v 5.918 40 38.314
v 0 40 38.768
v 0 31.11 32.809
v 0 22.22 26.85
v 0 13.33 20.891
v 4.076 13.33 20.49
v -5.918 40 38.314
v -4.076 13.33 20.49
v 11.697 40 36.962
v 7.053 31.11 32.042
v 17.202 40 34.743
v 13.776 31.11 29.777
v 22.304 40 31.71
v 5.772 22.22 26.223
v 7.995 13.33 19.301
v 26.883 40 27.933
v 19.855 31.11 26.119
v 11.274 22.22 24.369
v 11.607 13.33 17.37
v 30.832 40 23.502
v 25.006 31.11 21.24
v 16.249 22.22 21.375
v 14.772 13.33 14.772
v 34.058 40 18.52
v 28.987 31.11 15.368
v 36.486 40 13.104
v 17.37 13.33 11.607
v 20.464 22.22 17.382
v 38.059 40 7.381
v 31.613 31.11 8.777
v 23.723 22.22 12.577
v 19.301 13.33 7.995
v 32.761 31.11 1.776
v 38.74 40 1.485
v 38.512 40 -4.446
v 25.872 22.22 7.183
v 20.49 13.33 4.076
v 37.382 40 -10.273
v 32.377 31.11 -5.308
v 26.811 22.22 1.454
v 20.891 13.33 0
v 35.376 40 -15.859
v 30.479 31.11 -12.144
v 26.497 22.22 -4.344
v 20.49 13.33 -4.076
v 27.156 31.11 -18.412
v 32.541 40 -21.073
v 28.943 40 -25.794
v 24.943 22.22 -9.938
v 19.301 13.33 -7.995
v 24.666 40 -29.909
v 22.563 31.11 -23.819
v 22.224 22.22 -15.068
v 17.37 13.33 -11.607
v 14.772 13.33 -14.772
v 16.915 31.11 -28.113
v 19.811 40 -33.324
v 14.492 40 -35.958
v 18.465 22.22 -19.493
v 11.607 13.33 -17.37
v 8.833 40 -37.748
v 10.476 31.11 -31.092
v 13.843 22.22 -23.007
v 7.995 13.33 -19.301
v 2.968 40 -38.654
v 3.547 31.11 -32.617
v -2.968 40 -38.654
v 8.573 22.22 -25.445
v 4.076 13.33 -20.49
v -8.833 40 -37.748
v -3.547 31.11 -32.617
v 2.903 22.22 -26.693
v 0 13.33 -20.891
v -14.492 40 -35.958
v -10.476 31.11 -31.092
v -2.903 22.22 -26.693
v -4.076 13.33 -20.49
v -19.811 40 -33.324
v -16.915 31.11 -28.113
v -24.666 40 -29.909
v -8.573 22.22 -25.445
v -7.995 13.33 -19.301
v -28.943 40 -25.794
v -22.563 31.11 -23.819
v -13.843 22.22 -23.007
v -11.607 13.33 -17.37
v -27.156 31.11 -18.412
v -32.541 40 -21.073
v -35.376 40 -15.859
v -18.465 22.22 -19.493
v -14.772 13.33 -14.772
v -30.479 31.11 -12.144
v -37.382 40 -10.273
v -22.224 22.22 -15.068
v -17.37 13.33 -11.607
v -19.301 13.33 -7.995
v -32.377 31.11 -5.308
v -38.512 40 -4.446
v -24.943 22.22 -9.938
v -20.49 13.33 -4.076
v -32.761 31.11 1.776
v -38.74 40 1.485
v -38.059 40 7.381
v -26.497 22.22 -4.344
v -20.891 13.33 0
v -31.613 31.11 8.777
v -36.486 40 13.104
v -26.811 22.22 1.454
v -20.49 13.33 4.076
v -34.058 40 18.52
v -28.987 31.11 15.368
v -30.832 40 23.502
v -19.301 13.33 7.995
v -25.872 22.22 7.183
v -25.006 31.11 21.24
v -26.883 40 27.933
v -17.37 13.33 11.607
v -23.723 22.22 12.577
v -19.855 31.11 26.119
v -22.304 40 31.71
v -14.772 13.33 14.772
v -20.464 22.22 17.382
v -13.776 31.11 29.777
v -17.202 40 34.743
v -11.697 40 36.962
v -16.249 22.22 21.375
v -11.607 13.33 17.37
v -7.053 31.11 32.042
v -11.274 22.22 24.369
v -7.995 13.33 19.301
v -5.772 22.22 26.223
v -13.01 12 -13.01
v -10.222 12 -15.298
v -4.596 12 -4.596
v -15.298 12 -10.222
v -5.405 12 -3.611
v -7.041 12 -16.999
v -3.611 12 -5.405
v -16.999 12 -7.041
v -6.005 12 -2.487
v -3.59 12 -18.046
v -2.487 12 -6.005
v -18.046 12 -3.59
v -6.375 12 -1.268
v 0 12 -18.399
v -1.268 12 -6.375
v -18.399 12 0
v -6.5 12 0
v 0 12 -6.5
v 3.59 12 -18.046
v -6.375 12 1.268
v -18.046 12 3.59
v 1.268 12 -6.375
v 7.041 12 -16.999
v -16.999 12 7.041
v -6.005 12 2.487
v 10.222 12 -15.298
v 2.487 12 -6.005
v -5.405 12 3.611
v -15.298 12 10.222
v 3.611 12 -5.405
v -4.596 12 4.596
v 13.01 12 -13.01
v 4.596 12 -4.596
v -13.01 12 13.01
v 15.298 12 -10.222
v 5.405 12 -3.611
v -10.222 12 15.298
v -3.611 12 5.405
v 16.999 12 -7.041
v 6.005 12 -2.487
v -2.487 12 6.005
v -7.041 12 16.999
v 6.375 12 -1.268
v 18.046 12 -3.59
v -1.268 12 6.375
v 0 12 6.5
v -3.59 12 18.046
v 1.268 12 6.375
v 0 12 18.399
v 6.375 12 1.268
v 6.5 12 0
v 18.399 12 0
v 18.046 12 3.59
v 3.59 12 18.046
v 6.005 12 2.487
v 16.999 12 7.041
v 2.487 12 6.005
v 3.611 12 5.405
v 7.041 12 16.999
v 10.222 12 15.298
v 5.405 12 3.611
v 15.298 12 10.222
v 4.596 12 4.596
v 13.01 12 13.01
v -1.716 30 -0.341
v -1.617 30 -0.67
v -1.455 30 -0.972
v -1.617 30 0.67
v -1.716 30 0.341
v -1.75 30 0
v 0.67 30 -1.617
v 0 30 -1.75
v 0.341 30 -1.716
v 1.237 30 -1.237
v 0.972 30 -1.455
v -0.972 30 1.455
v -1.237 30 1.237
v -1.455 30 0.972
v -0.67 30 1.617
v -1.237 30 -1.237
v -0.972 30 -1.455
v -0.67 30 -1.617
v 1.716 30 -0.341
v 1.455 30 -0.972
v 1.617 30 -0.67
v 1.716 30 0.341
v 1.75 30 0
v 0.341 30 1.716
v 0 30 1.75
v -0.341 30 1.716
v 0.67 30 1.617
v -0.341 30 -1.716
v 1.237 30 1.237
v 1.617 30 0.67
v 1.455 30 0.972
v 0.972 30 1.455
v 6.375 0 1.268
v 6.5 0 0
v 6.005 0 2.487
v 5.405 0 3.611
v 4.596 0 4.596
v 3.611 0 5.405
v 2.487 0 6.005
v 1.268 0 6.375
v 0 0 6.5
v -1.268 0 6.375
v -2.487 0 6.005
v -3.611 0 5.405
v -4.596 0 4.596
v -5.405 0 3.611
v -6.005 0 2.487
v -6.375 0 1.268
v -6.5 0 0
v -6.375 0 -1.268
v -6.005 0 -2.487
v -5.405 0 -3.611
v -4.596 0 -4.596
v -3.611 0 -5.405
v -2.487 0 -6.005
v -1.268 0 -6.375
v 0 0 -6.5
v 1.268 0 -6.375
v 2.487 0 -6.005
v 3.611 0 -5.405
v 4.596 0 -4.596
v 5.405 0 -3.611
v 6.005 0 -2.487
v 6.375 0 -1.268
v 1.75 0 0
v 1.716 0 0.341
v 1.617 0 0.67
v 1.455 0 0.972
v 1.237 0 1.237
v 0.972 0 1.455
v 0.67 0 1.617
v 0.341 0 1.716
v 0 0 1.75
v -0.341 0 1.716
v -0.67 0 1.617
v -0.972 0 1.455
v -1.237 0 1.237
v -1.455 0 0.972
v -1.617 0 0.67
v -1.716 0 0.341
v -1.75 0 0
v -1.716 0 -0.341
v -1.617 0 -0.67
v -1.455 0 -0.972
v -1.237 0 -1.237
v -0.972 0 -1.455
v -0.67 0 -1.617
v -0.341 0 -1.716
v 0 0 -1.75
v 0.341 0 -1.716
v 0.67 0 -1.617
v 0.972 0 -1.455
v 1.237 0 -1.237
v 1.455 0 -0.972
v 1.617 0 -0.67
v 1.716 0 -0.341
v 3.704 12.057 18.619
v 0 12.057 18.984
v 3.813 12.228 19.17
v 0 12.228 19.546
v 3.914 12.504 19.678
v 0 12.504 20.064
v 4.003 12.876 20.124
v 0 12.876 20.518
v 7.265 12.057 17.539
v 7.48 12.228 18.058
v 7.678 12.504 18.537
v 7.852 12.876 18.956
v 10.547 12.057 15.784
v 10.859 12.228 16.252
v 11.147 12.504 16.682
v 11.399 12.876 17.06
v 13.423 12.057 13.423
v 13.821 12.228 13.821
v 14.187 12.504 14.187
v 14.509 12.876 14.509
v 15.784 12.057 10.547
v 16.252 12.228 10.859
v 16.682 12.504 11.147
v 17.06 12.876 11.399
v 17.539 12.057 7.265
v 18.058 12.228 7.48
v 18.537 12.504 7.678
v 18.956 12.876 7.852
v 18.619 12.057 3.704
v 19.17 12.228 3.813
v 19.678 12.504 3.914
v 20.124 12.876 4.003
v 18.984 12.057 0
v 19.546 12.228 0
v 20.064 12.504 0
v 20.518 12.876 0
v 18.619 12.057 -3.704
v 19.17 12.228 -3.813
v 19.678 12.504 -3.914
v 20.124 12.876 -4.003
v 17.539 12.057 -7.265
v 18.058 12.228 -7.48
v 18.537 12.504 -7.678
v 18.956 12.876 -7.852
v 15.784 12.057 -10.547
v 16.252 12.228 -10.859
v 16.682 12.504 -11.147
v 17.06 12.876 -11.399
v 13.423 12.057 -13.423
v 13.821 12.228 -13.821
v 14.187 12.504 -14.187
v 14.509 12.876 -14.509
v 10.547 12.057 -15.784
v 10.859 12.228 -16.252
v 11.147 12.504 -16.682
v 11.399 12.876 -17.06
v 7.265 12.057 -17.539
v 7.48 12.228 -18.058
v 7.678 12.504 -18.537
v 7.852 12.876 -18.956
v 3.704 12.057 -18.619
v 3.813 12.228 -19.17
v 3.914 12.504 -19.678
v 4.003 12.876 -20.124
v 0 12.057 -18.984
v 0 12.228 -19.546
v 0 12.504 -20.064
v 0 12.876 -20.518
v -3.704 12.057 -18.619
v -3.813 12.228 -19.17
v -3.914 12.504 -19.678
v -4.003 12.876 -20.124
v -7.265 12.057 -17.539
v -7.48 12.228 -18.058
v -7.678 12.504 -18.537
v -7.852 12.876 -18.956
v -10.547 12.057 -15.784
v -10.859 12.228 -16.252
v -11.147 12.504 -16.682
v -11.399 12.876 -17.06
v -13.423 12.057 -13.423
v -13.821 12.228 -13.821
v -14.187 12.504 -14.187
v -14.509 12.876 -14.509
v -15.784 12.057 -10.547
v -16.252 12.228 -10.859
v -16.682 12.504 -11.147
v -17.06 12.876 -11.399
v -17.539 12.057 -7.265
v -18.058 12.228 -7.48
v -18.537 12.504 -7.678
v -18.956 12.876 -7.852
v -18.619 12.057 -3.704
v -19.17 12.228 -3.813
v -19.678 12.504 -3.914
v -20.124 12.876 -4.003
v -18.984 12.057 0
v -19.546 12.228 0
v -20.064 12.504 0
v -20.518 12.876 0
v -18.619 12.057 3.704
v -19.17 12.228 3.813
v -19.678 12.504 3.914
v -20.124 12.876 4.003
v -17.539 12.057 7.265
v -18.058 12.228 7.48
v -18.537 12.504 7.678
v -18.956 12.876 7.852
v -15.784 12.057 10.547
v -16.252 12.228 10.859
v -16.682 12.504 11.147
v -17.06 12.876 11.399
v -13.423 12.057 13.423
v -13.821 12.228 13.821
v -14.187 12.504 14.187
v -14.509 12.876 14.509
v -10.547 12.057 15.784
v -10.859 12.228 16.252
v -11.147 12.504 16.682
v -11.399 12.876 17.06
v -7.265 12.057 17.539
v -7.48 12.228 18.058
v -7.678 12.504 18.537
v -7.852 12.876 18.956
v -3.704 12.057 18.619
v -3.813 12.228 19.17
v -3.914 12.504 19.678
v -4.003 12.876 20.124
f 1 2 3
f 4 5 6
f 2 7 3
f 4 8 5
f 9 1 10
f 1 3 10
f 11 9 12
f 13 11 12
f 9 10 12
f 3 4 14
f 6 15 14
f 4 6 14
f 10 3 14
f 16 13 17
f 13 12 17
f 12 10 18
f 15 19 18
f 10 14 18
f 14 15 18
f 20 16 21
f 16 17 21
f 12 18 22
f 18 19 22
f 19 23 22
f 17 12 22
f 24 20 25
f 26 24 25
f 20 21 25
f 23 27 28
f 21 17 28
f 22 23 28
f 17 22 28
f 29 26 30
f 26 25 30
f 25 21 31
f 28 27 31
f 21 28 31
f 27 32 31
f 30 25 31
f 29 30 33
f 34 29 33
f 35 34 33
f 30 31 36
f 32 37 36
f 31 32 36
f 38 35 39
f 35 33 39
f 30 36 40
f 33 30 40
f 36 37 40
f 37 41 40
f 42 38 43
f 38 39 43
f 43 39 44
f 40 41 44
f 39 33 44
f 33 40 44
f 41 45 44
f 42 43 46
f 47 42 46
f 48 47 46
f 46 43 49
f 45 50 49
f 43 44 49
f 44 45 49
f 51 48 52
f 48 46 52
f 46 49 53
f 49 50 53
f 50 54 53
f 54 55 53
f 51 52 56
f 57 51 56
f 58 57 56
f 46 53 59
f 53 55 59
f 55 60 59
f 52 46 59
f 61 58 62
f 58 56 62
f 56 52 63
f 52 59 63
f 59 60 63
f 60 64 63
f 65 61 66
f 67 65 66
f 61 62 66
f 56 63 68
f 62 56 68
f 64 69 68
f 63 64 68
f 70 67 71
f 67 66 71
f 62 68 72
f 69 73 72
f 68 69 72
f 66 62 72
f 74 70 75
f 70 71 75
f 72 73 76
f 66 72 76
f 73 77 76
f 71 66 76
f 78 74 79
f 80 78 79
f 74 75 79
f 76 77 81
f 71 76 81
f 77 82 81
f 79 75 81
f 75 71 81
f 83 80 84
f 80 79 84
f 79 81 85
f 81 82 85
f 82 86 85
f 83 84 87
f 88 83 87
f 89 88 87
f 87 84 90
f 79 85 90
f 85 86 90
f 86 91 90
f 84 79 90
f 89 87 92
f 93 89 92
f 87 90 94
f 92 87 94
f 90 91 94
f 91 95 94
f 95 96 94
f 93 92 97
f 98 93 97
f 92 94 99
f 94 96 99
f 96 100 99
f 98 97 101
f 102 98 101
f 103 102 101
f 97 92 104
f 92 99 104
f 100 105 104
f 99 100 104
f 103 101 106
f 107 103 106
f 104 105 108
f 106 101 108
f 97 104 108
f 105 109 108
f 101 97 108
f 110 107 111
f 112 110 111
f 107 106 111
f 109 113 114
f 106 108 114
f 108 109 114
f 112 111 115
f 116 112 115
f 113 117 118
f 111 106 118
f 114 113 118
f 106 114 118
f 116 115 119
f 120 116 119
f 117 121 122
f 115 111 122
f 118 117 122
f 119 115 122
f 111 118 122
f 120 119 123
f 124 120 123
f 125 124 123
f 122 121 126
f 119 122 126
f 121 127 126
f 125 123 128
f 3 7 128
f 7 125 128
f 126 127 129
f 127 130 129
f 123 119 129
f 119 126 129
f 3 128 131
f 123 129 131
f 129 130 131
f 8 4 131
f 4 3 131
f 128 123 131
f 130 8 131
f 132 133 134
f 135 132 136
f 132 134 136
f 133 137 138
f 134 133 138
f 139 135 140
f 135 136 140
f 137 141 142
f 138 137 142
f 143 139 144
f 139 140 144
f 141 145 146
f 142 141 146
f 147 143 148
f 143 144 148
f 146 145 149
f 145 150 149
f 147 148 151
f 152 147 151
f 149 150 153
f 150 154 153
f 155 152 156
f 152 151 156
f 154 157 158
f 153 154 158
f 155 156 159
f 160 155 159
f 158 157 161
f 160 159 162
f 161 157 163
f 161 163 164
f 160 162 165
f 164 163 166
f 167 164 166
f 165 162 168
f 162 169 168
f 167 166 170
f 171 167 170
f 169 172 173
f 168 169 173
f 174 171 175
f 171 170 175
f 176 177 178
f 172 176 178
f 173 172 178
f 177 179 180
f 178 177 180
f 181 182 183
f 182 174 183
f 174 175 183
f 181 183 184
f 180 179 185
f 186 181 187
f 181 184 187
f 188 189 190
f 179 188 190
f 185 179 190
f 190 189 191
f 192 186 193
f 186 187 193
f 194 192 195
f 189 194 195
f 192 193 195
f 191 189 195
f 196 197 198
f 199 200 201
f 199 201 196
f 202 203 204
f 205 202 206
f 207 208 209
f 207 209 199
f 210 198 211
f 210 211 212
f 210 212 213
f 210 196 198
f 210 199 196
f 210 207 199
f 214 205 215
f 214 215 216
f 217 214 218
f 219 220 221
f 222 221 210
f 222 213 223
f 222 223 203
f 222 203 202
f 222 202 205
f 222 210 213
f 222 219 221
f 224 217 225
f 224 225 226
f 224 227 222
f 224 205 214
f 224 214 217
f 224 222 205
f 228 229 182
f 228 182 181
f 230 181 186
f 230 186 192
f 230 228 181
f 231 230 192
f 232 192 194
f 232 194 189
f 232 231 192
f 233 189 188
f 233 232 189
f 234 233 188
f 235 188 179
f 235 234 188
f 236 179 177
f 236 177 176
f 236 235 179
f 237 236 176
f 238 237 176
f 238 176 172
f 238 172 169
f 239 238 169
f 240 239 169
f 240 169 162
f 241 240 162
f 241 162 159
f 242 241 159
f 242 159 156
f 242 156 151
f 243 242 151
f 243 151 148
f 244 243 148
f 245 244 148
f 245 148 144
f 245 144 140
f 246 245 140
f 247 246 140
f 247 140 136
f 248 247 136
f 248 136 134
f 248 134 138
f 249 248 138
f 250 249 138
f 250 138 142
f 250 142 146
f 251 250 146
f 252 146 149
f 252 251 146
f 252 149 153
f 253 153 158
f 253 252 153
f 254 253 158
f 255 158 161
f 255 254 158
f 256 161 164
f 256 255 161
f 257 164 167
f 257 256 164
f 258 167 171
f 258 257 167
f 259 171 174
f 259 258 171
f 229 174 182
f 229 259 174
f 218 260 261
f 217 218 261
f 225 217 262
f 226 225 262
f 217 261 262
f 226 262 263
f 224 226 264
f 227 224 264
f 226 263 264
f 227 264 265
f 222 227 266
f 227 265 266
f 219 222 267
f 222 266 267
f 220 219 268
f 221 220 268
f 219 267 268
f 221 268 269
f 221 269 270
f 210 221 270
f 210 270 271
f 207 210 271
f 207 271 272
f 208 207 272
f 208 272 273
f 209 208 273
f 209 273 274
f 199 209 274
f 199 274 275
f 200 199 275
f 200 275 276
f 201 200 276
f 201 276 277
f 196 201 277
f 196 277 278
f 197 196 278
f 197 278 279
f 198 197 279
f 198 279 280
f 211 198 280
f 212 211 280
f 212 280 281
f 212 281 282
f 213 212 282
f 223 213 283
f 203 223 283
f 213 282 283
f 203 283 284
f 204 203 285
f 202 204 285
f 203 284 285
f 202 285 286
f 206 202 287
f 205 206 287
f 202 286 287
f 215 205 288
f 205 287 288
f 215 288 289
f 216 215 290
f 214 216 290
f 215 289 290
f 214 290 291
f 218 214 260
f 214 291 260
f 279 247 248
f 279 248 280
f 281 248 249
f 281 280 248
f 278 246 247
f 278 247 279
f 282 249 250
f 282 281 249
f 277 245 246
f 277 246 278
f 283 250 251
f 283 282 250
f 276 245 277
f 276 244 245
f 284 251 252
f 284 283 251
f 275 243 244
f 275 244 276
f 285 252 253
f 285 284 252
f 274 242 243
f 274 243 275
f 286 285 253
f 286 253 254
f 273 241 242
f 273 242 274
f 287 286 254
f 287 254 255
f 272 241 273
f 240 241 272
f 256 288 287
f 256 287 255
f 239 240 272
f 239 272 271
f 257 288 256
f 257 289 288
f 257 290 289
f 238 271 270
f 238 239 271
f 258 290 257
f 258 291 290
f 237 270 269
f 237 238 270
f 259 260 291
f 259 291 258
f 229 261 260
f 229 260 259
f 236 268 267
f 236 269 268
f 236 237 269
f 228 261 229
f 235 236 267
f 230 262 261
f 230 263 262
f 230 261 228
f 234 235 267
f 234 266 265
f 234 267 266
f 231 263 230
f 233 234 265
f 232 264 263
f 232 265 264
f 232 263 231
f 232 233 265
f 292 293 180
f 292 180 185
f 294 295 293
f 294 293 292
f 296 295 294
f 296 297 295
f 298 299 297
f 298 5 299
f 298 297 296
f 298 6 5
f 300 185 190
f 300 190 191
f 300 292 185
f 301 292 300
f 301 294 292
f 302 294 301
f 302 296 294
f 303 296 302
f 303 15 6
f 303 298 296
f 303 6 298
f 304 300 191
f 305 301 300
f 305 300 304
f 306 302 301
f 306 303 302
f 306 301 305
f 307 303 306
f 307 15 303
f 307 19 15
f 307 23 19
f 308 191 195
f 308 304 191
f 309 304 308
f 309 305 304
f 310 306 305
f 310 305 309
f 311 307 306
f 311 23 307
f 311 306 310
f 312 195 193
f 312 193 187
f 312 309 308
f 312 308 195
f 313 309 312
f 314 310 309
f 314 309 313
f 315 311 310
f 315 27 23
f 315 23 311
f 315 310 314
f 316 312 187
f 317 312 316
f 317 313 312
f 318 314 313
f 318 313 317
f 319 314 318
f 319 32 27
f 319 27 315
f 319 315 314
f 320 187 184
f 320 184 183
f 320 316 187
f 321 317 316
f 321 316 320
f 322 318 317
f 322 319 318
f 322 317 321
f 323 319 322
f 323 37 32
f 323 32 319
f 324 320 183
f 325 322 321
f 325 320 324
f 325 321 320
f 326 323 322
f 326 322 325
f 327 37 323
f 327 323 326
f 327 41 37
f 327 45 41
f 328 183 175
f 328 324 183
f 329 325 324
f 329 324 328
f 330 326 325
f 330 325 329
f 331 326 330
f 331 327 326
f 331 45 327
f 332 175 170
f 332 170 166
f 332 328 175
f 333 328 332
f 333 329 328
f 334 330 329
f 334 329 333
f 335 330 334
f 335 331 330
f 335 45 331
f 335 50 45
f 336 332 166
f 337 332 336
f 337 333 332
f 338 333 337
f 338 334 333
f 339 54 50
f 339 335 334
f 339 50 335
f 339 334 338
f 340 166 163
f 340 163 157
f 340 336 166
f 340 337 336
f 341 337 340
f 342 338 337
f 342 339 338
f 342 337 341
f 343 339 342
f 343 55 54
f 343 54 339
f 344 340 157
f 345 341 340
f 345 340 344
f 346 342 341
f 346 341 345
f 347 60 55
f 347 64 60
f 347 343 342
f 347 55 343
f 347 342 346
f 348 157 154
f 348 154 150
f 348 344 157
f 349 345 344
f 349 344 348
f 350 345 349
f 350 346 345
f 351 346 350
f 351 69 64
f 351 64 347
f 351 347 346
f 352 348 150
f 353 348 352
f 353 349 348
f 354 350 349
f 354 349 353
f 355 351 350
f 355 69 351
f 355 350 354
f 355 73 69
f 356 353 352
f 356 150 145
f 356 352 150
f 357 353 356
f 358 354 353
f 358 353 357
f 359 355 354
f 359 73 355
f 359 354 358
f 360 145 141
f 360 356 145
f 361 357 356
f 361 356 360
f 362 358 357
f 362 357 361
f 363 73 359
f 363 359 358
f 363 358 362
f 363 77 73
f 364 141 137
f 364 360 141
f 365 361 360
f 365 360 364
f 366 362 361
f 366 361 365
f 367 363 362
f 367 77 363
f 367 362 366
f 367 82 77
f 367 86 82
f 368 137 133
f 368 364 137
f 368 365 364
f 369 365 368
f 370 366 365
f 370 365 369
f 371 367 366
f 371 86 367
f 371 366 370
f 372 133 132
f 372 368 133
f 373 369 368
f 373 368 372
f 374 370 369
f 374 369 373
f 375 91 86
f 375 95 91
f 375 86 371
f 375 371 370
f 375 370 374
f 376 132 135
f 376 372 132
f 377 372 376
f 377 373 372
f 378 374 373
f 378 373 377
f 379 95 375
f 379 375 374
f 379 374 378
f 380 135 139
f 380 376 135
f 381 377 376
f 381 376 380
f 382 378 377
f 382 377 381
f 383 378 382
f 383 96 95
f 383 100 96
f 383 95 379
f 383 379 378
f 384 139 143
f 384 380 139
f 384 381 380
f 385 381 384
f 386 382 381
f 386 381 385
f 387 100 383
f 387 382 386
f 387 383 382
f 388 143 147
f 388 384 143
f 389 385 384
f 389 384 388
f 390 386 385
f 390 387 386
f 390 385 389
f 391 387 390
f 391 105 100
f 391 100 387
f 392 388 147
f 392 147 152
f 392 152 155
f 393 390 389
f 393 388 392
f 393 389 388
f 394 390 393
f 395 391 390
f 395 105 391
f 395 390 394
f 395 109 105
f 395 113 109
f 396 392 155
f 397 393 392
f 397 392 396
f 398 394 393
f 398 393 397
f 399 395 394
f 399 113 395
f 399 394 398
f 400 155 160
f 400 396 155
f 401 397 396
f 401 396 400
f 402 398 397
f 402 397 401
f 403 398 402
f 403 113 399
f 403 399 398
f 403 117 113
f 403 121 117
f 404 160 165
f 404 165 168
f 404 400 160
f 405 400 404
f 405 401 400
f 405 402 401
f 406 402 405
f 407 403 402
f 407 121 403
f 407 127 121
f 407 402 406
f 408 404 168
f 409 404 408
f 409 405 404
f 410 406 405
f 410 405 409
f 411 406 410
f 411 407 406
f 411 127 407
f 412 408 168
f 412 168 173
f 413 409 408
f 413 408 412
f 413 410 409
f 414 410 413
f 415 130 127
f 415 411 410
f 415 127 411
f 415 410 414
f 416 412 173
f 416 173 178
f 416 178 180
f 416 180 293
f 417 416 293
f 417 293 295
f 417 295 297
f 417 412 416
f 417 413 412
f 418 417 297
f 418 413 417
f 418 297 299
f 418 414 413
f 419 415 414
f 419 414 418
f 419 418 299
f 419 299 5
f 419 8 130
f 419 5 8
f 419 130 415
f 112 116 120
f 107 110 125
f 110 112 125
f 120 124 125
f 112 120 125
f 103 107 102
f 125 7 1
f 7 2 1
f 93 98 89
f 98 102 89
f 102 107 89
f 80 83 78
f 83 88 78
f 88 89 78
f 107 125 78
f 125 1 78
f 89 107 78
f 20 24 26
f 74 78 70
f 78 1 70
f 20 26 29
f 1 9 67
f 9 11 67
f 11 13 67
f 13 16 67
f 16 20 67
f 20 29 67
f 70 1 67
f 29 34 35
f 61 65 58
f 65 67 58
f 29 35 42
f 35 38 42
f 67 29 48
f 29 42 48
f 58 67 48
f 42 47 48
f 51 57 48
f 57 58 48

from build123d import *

# Parameters (mm, degrees)
F0_R     = 6.5
F0_R_2   = 1.75
F3_DEPTH = 20
F4_DEPTH = 30
F5_R     = 3


with BuildPart() as f2:
    # F1 (on Right) → F2 (revolve)
    with BuildSketch(Plane.YZ):
        Polygon((12, 20), (12, 0), (40, 0), (40, 38.768247), align=None)
    revolve(axis=Axis((0, 35.946441, 0), (0, 1, 0)))

    # F0 (on Front) → F3 (join)
    with BuildSketch(Plane.XZ):
        Circle(F0_R)
        Circle(F0_R_2, mode=Mode.SUBTRACT)
    extrude(amount=-F3_DEPTH)

    # F0 (on Front) → F4 (cut)
    with BuildSketch(Plane.XZ):
        Circle(F0_R_2)
    extrude(amount=-F4_DEPTH, mode=Mode.SUBTRACT)

    # F5
    f5_edges = [f2.edges().sort_by_distance(p)[0] for p in [
        (0, 12, -20),
    ]]
    fillet(f5_edges, radius=F5_R)


solid = f2.part
